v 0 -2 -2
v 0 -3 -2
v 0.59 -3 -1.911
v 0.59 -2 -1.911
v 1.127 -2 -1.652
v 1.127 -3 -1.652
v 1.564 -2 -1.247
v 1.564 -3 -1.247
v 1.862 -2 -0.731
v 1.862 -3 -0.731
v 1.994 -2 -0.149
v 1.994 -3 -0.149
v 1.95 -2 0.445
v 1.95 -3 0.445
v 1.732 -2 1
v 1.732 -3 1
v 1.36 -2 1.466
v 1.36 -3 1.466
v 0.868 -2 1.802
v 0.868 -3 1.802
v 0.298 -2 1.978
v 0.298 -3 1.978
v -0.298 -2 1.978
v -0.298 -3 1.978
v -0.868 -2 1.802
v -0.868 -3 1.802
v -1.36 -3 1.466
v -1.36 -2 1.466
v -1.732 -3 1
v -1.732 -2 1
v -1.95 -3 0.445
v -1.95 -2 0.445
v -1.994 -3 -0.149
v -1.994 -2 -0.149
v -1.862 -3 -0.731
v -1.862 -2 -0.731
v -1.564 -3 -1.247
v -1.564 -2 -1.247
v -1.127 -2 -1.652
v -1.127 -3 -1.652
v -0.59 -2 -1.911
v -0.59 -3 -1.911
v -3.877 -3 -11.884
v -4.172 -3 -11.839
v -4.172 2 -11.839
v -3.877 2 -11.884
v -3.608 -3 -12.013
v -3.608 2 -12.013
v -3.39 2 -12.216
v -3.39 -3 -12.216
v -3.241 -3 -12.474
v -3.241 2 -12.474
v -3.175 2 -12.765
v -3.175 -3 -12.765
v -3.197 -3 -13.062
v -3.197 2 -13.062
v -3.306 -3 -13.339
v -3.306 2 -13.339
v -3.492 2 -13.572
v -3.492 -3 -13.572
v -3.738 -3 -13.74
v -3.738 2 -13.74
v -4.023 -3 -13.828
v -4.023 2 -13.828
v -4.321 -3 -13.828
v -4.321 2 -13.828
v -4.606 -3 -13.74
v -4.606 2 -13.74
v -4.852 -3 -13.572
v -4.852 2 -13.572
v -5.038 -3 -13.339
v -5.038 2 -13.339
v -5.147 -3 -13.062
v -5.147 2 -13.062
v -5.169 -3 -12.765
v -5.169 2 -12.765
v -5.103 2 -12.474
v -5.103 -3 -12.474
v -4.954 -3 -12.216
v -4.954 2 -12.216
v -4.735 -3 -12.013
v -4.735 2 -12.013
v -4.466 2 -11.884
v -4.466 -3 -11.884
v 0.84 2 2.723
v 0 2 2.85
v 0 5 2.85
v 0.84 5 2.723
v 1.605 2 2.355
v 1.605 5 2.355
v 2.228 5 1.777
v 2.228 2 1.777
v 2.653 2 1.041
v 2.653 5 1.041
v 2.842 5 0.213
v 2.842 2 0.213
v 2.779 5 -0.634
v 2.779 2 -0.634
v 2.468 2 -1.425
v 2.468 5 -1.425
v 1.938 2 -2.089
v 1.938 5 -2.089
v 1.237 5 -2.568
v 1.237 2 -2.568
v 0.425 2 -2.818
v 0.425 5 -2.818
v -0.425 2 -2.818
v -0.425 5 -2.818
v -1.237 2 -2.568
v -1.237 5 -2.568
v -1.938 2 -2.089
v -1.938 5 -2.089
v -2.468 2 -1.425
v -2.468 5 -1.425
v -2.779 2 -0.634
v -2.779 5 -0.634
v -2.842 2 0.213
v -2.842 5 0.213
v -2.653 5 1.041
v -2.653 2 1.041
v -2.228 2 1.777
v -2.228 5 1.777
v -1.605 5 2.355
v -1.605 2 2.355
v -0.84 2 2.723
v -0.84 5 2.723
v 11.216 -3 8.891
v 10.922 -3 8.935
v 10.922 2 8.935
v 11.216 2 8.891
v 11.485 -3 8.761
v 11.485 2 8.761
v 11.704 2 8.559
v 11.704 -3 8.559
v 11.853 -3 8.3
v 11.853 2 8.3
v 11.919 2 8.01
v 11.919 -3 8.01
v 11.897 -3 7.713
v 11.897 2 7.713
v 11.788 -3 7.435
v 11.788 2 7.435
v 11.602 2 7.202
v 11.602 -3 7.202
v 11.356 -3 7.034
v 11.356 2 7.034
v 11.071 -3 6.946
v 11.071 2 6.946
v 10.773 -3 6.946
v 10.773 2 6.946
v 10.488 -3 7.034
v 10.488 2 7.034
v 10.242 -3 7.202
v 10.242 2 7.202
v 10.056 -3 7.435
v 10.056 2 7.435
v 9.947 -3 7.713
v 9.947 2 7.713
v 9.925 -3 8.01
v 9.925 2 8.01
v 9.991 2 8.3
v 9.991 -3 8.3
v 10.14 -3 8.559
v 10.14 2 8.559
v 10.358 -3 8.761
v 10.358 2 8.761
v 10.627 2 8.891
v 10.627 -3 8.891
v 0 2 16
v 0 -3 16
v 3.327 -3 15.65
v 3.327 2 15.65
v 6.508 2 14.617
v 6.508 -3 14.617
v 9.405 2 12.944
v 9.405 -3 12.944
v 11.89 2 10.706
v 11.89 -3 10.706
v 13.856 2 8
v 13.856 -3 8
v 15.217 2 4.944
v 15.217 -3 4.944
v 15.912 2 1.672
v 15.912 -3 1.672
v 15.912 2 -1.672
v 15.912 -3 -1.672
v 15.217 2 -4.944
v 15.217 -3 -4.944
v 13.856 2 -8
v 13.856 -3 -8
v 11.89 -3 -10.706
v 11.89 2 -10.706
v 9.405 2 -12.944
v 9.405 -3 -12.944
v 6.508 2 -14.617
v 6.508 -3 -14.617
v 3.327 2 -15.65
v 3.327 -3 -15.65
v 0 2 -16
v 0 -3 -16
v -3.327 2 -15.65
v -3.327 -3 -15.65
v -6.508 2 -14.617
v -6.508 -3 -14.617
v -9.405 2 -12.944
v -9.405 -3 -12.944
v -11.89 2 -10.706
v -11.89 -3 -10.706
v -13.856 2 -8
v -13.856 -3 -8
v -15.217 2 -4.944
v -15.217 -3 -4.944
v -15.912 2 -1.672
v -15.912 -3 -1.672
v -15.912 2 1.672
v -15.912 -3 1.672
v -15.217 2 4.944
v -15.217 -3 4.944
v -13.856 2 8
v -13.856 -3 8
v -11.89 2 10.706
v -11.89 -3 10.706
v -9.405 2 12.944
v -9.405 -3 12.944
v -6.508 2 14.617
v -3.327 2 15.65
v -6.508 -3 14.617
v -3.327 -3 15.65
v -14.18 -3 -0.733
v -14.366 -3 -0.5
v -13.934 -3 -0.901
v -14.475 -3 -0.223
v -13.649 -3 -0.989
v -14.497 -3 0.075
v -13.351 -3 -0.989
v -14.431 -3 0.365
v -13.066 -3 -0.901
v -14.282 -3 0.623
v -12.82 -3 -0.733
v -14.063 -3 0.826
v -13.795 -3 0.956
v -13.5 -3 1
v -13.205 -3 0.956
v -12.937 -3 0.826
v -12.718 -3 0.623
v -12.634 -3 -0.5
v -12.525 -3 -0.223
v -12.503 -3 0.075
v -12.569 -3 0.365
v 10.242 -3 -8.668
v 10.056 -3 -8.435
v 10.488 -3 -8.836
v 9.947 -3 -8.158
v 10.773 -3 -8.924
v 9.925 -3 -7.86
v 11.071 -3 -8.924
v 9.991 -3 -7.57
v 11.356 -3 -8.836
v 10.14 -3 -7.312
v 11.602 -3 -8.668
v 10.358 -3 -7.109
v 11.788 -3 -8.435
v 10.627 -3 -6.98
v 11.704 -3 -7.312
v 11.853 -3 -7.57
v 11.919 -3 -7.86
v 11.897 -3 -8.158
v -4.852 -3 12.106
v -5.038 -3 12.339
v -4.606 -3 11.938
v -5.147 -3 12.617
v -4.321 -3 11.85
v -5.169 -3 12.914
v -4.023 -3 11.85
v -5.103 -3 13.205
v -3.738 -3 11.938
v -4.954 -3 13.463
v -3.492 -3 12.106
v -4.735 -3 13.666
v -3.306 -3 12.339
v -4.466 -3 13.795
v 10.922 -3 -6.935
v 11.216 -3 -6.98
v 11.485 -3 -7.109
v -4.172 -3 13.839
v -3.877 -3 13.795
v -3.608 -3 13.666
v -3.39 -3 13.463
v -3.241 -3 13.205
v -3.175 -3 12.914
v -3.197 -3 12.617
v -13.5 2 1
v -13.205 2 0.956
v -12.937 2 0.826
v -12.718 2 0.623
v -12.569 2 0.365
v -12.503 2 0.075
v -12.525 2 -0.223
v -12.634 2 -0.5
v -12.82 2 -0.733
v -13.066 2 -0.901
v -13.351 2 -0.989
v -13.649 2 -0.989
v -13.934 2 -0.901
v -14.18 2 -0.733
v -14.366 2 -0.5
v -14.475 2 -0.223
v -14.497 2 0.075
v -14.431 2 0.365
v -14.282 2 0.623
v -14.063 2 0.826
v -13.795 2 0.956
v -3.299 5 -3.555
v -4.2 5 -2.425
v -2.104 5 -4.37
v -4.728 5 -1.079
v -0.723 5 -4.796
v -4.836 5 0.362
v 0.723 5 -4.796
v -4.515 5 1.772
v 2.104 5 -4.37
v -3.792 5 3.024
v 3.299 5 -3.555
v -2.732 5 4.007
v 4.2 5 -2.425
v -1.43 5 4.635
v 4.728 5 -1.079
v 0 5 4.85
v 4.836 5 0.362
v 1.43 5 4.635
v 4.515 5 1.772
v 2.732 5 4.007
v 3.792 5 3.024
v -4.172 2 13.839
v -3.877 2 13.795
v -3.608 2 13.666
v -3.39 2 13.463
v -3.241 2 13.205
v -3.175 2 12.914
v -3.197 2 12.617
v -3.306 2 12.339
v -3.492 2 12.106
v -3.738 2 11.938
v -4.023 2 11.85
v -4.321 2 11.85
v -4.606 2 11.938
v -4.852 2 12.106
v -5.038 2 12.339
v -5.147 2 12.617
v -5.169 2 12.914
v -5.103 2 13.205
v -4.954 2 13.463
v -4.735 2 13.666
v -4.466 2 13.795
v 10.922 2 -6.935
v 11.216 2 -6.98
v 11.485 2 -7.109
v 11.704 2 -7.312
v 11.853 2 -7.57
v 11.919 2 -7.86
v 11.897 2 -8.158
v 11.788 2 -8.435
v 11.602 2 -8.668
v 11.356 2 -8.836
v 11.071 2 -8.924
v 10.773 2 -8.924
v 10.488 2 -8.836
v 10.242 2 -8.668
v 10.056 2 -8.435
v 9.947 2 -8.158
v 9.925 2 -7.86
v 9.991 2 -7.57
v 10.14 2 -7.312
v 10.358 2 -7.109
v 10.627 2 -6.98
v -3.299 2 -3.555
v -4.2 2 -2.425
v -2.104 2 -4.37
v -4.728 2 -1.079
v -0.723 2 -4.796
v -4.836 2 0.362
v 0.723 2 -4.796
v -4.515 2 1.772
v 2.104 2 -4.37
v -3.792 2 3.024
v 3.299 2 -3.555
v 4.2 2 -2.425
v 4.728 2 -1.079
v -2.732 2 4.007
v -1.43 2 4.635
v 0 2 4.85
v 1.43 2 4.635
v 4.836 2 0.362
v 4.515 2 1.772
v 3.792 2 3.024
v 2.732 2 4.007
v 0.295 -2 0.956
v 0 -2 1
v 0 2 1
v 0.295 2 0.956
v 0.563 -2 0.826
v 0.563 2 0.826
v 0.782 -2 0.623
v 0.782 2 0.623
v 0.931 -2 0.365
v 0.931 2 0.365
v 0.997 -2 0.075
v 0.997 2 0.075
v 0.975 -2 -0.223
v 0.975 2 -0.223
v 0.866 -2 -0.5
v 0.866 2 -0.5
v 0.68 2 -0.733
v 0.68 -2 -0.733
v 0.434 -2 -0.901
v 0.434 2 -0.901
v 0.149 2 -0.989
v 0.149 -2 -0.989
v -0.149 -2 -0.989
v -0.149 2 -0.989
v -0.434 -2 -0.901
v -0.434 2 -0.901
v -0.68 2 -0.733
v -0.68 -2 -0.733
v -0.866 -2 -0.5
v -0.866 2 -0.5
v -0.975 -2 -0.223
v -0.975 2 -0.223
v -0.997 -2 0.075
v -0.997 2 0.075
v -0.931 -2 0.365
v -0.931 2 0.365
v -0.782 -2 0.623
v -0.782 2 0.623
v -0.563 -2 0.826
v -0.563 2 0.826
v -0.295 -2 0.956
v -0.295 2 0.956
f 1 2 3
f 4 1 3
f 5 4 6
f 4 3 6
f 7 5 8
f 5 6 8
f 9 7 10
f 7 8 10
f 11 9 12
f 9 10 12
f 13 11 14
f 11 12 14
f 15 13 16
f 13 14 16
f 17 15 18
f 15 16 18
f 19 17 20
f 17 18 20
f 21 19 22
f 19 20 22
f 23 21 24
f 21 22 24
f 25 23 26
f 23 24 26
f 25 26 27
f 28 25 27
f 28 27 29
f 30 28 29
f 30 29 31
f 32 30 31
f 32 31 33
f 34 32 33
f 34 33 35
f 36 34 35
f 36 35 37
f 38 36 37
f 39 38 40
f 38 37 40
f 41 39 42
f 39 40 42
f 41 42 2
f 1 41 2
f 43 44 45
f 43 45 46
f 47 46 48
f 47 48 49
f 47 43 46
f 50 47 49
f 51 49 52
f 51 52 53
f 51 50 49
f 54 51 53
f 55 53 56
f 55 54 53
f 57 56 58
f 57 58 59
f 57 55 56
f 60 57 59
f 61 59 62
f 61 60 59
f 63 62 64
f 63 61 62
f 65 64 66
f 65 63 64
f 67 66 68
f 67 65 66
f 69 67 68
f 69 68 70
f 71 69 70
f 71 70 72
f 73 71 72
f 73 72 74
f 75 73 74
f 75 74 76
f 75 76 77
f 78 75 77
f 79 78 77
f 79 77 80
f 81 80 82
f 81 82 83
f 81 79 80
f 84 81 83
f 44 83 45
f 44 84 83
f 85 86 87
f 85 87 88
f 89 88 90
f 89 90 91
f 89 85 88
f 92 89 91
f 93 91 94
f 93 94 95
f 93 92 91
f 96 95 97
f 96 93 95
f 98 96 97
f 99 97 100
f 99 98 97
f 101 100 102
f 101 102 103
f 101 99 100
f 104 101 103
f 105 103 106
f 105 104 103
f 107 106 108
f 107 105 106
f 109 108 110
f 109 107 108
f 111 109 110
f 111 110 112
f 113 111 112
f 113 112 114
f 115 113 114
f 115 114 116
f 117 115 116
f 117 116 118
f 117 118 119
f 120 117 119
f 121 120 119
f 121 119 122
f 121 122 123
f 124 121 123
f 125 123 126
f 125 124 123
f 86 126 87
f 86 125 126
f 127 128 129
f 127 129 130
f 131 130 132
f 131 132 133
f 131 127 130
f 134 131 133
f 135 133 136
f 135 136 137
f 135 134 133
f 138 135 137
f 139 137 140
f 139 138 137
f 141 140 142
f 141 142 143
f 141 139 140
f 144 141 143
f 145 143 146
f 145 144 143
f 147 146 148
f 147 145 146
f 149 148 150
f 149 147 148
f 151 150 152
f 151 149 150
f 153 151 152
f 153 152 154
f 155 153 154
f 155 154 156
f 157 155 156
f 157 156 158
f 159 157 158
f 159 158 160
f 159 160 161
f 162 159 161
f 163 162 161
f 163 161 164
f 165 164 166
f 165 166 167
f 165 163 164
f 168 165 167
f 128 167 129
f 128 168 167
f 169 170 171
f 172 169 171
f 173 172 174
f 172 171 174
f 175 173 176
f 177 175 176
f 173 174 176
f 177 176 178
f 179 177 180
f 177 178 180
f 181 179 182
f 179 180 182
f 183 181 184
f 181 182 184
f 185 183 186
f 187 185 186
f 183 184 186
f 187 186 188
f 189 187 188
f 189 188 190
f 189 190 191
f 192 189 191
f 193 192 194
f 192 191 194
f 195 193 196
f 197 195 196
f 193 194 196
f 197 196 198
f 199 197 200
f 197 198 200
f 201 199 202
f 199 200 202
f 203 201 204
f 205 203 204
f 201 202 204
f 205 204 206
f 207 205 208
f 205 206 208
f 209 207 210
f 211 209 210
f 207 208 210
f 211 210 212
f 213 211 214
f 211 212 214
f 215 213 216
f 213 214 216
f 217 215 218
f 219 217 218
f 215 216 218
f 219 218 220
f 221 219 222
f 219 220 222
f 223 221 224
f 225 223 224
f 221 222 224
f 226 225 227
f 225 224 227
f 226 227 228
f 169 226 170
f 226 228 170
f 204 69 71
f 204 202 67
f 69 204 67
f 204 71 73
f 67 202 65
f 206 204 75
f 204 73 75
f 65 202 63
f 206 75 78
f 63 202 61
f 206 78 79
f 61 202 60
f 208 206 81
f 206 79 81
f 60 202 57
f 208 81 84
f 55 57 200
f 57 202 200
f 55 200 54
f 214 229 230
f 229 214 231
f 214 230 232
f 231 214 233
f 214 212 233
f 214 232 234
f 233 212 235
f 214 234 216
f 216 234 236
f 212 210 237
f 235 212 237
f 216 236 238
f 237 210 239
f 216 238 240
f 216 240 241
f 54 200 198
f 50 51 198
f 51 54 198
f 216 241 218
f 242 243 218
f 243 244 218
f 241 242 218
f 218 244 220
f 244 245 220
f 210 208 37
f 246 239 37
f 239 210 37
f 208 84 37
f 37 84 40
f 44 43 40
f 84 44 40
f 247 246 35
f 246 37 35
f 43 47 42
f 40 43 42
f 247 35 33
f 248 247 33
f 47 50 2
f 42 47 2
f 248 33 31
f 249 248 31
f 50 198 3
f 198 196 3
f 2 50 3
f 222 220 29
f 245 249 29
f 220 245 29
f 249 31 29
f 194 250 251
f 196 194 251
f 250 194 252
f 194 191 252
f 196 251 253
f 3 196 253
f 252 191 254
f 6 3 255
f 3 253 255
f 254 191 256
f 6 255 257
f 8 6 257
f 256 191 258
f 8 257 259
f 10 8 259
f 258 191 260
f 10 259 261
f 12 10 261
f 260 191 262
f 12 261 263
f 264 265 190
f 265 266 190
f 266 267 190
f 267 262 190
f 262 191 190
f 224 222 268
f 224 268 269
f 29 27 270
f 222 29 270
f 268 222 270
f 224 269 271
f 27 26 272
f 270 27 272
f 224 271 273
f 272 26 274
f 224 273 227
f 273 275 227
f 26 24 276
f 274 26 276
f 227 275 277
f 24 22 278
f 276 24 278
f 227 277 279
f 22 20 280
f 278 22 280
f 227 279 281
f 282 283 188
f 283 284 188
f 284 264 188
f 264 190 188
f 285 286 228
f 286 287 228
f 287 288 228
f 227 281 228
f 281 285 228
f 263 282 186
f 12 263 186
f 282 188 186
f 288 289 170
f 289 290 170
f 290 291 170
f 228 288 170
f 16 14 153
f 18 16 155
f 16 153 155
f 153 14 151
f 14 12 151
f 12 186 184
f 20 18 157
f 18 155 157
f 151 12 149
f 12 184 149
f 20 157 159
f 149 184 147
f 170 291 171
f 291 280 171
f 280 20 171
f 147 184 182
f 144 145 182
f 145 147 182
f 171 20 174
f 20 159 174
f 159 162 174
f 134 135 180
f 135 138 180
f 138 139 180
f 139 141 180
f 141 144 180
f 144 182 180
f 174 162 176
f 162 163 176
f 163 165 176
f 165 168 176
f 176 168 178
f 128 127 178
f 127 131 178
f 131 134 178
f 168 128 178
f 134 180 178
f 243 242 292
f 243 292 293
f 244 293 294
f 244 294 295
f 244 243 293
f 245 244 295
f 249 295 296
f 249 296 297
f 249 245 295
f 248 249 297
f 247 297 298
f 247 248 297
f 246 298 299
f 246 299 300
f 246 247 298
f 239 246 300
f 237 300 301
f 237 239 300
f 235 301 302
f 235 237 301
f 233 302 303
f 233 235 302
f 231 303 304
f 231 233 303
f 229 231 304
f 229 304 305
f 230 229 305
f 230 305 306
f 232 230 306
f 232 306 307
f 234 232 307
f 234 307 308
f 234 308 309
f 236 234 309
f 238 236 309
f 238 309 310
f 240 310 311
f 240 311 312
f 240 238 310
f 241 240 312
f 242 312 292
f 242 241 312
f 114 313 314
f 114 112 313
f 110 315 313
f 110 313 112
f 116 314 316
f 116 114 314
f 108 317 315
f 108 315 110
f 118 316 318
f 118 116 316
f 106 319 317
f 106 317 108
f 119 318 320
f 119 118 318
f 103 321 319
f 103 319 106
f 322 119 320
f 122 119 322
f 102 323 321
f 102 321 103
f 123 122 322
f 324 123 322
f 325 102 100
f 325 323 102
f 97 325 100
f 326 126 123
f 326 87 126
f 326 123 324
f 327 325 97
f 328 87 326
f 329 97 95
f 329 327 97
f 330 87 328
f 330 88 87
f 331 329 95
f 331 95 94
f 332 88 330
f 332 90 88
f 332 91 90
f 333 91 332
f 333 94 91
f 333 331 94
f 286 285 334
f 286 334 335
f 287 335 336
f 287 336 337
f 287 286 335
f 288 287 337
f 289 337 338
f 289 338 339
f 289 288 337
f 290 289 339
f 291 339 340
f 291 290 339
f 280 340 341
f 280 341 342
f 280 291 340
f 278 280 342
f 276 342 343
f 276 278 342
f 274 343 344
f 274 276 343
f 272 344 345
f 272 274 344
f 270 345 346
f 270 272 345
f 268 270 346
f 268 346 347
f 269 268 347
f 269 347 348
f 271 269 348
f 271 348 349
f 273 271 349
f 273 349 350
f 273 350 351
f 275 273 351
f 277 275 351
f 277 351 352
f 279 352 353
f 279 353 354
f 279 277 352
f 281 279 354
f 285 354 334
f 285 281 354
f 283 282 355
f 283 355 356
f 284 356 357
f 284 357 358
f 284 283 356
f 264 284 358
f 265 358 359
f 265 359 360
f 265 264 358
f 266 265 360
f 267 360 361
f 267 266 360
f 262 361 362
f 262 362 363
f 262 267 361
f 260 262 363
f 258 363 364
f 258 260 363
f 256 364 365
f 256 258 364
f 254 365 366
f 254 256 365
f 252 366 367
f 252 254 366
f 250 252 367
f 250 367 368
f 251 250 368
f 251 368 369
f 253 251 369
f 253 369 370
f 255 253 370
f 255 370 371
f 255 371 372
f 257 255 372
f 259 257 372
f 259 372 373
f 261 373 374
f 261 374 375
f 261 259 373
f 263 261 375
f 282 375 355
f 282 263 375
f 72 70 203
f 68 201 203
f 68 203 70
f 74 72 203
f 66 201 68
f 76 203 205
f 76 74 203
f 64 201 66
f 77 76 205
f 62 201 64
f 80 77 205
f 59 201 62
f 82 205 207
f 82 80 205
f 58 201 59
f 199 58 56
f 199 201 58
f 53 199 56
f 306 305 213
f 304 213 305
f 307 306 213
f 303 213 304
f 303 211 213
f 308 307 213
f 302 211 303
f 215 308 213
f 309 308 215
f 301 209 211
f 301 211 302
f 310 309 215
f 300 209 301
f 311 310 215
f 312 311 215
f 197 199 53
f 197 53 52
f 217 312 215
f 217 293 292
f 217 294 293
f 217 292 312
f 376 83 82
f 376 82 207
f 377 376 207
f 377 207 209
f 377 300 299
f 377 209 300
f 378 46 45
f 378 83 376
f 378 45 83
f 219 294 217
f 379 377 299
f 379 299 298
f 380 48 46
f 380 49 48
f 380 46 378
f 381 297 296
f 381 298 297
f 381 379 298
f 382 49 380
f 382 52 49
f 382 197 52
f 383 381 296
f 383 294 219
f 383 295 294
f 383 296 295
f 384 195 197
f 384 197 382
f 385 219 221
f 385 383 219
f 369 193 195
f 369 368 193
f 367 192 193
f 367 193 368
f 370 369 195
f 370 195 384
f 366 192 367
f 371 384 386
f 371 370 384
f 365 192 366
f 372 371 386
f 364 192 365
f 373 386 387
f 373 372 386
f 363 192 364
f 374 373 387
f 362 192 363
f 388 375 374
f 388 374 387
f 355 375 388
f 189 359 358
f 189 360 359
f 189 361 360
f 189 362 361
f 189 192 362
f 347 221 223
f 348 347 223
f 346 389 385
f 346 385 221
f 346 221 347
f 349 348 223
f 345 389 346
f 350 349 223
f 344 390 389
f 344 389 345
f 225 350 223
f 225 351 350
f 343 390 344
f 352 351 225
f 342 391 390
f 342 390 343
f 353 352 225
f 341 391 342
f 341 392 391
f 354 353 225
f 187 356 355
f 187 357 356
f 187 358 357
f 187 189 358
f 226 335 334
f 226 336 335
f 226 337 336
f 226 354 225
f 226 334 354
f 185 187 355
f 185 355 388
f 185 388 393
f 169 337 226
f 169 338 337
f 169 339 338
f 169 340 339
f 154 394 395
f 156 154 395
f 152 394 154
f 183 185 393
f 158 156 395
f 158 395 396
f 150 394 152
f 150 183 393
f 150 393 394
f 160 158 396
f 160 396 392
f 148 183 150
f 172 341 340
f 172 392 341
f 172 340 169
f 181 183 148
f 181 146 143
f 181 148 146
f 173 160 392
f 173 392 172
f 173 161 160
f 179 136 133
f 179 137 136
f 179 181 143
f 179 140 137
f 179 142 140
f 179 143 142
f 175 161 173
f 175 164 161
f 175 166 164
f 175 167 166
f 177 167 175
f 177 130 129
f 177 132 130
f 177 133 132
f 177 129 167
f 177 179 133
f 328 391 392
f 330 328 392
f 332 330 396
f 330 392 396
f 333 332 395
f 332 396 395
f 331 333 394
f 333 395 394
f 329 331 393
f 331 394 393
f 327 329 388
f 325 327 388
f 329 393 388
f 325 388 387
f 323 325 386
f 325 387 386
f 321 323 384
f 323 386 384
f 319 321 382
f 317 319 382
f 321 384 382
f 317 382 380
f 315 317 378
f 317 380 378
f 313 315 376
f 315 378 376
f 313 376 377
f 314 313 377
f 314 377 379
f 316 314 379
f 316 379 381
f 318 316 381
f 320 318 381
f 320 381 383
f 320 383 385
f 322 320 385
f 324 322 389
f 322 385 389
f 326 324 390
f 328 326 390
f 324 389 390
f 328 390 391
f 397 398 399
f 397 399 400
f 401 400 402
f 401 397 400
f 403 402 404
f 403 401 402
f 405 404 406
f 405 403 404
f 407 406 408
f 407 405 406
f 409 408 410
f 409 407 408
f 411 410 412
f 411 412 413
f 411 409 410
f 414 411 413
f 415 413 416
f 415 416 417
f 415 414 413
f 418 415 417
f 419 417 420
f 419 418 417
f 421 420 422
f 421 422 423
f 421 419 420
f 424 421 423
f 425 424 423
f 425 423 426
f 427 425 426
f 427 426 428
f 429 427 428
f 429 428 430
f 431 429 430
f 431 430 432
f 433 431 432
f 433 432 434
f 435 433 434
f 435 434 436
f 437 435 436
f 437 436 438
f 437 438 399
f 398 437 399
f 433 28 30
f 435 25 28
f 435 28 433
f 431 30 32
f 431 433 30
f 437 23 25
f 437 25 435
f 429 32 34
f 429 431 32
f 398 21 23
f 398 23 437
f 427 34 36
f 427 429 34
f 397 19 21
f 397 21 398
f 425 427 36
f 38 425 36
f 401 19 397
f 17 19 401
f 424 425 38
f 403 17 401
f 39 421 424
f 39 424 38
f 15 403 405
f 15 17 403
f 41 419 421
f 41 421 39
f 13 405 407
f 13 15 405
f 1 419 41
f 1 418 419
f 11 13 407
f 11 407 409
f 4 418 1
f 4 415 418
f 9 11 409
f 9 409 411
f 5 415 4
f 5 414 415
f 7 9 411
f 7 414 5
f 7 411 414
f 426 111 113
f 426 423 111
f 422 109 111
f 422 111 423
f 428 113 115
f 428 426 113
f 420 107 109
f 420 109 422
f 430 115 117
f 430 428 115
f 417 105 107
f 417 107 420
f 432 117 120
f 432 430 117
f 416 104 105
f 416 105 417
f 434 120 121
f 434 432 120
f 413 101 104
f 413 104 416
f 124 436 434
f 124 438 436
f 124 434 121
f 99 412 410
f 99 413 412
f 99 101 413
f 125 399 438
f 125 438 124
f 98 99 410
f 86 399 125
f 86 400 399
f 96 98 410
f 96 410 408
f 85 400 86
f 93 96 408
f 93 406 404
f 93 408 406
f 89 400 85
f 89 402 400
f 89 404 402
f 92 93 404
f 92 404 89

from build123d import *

# Parameters (mm, degrees)
BOSS_EXTRUDE1_DEPTH      = 2
BOSS_EXTRUDE1_DEPTH_BACK = 3
SKETCH1_R                = 16
SKETCH1_R_2              = 1
SKETCH2_R                = 4.85
SKETCH2_R_2              = 2.85
BOSS_EXTRUDE3_DEPTH      = 3
SKETCH5_R                = 2
CUT_EXTRUDE2_DEPTH       = 1


with BuildPart() as part:
    # Sketch1 → Boss-Extrude1 (new, two sides: drawn at the far end of the back side and taken through both)
    with BuildSketch(Plane(origin=(0, 0, 0), x_dir=(1, 0, 0), z_dir=(0, 1, 0)).offset(-BOSS_EXTRUDE1_DEPTH_BACK)):
        with Locations(Location((0, 0, 0), (0, 0, 270))):
            Circle(SKETCH1_R)
        with Locations(Location((0, 0, 0), (0, 0, 270))):
            Circle(SKETCH1_R_2, mode=Mode.SUBTRACT)
        with Locations(Location((-13.5, 0, 0), (0, 0, 270))):
            Circle(SKETCH1_R_2, mode=Mode.SUBTRACT)
        with Locations(Location((-4.171729424, 12.83926297, 0), (0, 0, 270))):
            Circle(SKETCH1_R_2, mode=Mode.SUBTRACT)
        with Locations(Location((10.921729424, 7.935100906, 0), (0, 0, 270))):
            Circle(SKETCH1_R_2, mode=Mode.SUBTRACT)
        with Locations(Location((10.921729424, -7.935100906, 0), (0, 0, 270))):
            Circle(SKETCH1_R_2, mode=Mode.SUBTRACT)
        with Locations(Location((-4.171729424, -12.83926297, 0), (0, 0, 270))):
            Circle(SKETCH1_R_2, mode=Mode.SUBTRACT)
    extrude(amount=BOSS_EXTRUDE1_DEPTH + BOSS_EXTRUDE1_DEPTH_BACK)

    # Sketch2 → Boss-Extrude3 (add)
    with BuildSketch(Plane(origin=(0, 2, 0), x_dir=(1, 0, 0), z_dir=(0, 1, 0))):
        with Locations(Location((0, 0, 0), (0, 0, 270))):
            Circle(SKETCH2_R)
        with Locations(Location((0, 0, 0), (0, 0, 270))):
            Circle(SKETCH2_R_2, mode=Mode.SUBTRACT)
    extrude(amount=BOSS_EXTRUDE3_DEPTH)

    # Sketch5 → Cut-Extrude2 (cut)
    with BuildSketch(Plane.XZ.offset(3)):
        with Locations(Location((0, 0, 0), (0, 0, 270))):
            Circle(SKETCH5_R)
    extrude(amount=-CUT_EXTRUDE2_DEPTH, mode=Mode.SUBTRACT)


solid = part.part
